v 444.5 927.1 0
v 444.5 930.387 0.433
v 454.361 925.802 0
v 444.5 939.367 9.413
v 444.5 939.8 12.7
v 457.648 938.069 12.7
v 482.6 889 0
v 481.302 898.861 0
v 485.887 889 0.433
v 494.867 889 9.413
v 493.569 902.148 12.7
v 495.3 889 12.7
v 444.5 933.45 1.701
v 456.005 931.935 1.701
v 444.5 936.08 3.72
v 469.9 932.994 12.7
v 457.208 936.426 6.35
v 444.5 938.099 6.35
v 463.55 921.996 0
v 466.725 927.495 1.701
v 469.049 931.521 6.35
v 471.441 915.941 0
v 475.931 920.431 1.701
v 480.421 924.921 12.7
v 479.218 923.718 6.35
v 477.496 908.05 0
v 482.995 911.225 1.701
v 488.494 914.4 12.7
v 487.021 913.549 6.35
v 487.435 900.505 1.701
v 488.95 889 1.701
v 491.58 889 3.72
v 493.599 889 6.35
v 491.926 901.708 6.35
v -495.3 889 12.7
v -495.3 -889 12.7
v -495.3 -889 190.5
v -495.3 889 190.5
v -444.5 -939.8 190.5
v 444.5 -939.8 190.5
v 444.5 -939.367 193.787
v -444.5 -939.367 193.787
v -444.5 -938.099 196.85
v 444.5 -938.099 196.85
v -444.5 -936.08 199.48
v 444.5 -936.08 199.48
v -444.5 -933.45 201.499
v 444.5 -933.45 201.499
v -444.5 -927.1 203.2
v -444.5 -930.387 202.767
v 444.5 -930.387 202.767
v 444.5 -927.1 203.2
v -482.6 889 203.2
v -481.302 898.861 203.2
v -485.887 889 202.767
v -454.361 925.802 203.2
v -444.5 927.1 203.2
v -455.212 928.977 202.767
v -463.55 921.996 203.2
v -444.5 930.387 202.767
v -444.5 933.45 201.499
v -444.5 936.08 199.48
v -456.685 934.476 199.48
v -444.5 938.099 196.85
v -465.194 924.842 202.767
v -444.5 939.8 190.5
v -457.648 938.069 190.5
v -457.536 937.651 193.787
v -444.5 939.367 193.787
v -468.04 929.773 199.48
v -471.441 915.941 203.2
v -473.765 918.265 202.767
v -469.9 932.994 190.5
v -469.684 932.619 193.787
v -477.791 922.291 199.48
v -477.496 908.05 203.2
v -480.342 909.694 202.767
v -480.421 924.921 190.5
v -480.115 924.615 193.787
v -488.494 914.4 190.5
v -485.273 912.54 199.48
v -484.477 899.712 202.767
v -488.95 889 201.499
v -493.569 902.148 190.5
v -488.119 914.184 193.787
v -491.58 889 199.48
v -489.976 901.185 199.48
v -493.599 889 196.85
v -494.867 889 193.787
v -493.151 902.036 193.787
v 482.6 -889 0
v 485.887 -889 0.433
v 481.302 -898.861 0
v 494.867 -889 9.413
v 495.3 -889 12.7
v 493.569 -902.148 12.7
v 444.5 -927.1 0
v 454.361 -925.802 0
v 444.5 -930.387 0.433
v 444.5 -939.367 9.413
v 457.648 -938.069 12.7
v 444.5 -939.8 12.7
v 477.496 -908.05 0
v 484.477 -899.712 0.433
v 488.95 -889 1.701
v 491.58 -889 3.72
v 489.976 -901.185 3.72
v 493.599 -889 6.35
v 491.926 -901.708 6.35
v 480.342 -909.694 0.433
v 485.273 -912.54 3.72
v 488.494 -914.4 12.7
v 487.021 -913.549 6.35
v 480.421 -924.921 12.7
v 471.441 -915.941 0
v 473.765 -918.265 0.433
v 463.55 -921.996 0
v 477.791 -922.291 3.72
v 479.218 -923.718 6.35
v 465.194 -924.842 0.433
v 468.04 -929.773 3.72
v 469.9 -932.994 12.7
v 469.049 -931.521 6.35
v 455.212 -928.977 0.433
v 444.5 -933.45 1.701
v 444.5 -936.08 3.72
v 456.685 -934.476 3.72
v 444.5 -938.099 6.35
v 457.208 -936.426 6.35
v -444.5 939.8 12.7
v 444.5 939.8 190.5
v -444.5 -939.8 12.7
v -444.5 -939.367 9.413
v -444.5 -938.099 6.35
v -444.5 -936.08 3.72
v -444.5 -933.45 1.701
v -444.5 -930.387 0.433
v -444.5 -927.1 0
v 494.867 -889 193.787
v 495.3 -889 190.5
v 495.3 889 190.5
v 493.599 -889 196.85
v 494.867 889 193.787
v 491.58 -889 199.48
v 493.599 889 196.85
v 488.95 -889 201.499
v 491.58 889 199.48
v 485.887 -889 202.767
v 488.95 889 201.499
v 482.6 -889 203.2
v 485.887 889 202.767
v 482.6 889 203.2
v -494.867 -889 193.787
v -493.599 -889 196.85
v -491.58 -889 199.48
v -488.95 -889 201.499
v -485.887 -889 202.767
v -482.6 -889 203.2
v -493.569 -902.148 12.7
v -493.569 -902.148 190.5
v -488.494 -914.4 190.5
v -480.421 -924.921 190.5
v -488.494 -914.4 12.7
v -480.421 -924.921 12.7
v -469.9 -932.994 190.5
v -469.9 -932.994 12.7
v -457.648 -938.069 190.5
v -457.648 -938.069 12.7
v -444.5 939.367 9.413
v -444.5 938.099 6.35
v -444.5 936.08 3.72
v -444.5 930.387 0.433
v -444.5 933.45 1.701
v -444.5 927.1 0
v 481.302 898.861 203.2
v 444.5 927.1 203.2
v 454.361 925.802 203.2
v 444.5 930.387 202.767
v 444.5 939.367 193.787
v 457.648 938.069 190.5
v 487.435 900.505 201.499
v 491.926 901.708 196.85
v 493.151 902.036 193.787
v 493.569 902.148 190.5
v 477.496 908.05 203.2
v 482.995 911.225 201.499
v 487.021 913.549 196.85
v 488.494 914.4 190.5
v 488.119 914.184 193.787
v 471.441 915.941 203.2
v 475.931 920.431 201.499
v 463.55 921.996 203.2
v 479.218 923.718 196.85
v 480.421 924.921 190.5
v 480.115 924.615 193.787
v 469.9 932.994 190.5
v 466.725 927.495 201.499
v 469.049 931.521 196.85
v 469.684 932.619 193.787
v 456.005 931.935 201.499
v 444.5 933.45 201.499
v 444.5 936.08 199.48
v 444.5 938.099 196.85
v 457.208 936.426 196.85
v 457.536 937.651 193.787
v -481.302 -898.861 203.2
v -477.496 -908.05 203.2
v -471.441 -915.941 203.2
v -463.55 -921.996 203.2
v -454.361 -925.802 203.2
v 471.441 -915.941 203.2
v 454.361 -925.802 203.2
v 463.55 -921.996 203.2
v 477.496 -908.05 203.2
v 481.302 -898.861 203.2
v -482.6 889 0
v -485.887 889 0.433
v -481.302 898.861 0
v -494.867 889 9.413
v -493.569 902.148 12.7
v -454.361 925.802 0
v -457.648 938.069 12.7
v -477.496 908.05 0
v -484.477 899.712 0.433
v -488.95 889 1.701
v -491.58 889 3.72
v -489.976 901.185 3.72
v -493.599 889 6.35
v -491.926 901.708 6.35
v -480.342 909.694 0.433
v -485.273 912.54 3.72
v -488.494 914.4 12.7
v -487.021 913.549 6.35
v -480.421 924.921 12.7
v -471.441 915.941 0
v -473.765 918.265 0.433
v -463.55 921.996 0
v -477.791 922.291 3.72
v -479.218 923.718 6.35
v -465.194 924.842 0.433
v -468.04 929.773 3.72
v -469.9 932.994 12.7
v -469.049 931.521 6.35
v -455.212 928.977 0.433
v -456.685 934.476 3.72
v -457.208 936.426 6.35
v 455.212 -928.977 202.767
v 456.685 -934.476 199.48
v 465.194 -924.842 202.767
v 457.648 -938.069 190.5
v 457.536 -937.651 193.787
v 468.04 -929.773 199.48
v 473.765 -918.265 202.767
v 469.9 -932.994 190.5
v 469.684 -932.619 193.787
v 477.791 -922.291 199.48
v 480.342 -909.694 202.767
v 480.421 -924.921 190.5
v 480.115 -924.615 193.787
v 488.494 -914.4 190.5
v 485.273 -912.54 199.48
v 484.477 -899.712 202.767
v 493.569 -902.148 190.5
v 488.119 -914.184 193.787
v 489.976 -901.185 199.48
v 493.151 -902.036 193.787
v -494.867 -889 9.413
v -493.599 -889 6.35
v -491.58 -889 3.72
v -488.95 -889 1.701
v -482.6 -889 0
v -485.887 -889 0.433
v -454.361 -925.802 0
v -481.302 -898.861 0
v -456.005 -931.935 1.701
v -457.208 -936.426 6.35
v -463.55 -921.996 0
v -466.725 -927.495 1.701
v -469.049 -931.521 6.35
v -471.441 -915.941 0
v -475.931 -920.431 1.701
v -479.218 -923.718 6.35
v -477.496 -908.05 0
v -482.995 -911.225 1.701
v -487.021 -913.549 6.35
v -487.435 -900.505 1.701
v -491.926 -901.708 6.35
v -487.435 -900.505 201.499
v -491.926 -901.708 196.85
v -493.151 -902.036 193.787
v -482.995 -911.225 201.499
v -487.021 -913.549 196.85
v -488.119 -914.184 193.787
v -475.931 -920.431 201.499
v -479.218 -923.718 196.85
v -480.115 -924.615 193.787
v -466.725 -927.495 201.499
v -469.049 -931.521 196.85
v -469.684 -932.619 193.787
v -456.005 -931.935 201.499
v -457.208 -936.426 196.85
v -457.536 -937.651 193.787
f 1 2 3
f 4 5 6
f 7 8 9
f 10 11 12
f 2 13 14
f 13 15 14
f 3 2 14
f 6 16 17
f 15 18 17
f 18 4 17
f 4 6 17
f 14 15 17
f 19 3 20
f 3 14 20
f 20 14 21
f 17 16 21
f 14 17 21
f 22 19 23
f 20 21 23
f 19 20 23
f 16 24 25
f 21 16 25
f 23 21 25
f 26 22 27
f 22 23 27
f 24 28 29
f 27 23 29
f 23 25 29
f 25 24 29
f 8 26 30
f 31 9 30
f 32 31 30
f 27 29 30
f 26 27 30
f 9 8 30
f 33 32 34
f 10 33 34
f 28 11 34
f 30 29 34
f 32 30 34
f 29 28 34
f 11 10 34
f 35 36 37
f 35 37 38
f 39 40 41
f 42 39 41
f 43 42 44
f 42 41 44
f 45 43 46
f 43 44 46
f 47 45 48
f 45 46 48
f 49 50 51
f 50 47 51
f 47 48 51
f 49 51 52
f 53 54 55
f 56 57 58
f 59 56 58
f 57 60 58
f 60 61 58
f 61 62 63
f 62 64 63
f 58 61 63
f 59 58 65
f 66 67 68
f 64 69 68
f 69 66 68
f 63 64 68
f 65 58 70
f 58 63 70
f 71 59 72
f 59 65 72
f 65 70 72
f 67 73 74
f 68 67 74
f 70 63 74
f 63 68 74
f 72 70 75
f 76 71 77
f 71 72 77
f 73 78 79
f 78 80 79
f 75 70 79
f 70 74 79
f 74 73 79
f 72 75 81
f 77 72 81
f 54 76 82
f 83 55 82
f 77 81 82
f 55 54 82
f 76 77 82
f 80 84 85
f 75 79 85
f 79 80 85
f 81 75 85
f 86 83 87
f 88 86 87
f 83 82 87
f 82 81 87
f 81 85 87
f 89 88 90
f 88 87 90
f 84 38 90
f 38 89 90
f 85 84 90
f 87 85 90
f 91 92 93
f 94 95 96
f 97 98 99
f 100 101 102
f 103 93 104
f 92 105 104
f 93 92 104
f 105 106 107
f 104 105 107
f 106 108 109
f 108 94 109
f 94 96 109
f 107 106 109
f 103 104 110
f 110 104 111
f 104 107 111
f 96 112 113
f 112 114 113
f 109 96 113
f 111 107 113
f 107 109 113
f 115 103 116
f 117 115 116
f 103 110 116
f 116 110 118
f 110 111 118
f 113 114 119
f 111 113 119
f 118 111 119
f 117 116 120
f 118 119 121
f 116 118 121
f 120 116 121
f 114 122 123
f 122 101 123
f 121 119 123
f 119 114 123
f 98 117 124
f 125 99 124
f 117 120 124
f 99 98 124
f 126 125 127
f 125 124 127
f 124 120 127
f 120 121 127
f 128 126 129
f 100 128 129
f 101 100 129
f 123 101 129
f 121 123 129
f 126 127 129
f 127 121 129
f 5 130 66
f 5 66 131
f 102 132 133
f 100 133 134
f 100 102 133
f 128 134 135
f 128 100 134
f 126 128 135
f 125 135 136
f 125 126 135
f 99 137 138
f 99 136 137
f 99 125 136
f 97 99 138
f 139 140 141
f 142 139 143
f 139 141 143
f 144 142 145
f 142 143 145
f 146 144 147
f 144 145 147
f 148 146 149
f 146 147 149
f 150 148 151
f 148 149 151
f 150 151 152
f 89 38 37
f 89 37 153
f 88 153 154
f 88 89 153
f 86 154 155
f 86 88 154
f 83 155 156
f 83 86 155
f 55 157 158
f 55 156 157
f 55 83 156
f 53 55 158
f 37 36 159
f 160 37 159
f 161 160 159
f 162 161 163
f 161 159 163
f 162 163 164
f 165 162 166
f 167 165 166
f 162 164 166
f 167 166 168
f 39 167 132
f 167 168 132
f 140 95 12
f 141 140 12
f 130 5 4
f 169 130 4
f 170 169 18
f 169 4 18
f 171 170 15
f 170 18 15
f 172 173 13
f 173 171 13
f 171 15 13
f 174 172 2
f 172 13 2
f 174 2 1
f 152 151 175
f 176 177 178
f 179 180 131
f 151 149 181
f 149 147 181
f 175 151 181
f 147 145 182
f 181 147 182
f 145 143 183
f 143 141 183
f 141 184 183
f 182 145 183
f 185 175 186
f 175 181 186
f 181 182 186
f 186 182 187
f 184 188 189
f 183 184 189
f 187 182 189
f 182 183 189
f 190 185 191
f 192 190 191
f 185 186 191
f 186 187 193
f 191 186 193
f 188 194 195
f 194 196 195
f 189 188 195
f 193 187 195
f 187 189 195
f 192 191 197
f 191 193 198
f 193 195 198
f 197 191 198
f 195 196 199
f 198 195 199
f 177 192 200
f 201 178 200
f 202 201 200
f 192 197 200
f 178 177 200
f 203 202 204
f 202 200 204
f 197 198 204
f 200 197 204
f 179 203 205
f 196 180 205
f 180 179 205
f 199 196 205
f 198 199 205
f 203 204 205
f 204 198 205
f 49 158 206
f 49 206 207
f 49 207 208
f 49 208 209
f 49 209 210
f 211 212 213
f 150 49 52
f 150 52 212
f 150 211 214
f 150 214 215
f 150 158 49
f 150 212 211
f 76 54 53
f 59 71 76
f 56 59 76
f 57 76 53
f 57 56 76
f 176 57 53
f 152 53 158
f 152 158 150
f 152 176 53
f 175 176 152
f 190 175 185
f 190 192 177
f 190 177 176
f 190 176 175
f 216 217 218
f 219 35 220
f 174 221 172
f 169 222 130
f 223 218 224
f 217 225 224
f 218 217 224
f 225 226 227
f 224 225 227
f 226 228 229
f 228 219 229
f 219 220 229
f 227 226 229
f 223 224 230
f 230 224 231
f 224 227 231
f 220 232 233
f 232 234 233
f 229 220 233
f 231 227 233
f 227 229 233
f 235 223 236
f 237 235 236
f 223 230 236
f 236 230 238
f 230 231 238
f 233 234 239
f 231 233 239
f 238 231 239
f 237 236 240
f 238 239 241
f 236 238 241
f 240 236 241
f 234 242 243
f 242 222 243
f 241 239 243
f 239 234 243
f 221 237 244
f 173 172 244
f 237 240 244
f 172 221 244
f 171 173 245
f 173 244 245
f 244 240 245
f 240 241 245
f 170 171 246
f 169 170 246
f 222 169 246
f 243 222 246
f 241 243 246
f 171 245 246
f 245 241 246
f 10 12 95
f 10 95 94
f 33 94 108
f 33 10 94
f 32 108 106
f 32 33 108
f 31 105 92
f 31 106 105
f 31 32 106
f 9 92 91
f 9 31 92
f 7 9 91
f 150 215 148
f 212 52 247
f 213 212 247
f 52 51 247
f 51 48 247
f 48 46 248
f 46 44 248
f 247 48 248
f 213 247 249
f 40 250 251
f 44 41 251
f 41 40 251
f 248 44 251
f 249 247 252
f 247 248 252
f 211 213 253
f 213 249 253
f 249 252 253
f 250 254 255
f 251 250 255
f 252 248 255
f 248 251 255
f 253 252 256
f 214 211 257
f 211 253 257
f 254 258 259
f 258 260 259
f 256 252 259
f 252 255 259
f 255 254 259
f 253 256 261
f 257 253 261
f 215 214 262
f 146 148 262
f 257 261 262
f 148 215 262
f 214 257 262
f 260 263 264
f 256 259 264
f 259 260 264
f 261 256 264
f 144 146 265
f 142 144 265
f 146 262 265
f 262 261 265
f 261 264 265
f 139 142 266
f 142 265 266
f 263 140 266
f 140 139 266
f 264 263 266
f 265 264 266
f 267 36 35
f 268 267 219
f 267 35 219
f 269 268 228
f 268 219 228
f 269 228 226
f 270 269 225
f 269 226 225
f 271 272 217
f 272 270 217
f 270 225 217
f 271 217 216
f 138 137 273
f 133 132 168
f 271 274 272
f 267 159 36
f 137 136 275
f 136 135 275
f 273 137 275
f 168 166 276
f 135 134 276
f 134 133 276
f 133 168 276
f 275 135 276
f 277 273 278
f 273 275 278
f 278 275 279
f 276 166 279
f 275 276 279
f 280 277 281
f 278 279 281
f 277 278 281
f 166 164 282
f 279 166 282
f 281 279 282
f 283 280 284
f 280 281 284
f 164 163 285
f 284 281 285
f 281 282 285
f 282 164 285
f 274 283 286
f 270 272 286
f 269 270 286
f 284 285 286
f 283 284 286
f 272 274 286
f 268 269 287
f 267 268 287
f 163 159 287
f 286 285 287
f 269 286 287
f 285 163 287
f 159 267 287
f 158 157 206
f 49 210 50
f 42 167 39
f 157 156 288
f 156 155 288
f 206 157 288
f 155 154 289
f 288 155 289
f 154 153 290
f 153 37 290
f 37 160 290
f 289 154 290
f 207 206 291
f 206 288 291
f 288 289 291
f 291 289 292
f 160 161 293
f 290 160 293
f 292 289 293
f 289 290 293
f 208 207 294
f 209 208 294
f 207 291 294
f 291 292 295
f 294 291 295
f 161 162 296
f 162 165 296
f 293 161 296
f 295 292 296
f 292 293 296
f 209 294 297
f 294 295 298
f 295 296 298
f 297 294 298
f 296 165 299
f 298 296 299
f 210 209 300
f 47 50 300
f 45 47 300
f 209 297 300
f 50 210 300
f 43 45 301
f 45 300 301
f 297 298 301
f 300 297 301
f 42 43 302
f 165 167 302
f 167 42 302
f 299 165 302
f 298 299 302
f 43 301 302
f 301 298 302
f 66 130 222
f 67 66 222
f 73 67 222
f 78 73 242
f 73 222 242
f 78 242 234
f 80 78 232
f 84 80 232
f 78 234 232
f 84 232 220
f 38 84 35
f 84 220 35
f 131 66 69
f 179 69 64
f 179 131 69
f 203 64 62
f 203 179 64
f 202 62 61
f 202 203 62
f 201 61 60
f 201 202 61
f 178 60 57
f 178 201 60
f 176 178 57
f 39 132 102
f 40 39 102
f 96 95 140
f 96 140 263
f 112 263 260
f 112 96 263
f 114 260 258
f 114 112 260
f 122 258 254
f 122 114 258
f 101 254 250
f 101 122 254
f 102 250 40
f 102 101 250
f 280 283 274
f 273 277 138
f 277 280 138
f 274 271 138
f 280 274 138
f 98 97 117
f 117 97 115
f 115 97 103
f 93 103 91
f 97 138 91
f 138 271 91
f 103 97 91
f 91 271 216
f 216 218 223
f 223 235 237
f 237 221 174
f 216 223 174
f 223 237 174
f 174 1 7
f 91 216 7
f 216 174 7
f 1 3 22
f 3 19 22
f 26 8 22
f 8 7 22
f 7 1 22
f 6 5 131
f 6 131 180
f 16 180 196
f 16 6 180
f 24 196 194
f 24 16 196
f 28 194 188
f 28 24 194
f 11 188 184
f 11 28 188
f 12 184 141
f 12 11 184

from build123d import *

# Parameters (mm, degrees)
F0_W         = 990.6
F0_H         = 1879.6
F1_DEPTH     = 203.2
F2_R         = 12.7
F3_T1_DEPTH  = 203.2
F3_T4_ANGLE  = 90
F3_T6_ANGLE  = 90
F3_T8_ANGLE  = 90
F3_T10_ANGLE = 90
F3_T12_ANGLE = 90
F3_T14_ANGLE = 90
F3_T16_ANGLE = 90
F3_T18_ANGLE = 90


# Not quite as in the source:
# - a fillet or chamfer that OpenCascade refuses, or shapes differently, is made with other operations: its cross-section is extruded or revolved along the edge and cut away or added


with BuildPart() as f1:
    # F0 (on Top) → F1 (new body)
    with BuildSketch(Plane.XY):
        Rectangle(F0_W, F0_H)
    extrude(amount=F1_DEPTH)

    # F2
    f2_edges = [f1.edges().sort_by_distance(p)[0] for p in [
        (-495.3, 0, 203.2),
        (0, -939.8, 203.2),
        (495.3, 0, 203.2),
        (0, 939.8, 203.2),
        (495.3, 0, 0),
        (0, -939.8, 0),
        (-495.3, 0, 0),
        (0, 939.8, 0),
    ]]
    fillet(f2_edges, radius=F2_R)

    # F3: fillet of radius 50.8 on 4 edges, made by hand

    # F3_s2 → F3_t1 (cut)
    with BuildSketch(Plane.XY):
        with BuildLine():
            ThreePointArc((-495.3, -889), (-480.4210244843, -924.9210244843), (-444.5, -939.8))
            Line((-444.5, -939.8), (-444.5, -940.816))
            Line((-444.5, -940.816), (-496.316, -940.816))
            Line((-496.316, -940.816), (-496.316, -889))
            Line((-496.316, -889), (-495.3, -889))
        make_face()
        with BuildLine():
            ThreePointArc((495.3, -889), (480.4210244843, -924.9210244843), (444.5, -939.8))
            Line((444.5, -939.8), (444.5, -940.816))
            Line((444.5, -940.816), (496.316, -940.816))
            Line((496.316, -940.816), (496.316, -889))
            Line((496.316, -889), (495.3, -889))
        make_face()
        with BuildLine():
            ThreePointArc((444.5, 939.8), (480.4210244843, 924.9210244843), (495.3, 889))
            Line((495.3, 889), (496.316, 889))
            Line((496.316, 889), (496.316, 940.816))
            Line((496.316, 940.816), (444.5, 940.816))
            Line((444.5, 940.816), (444.5, 939.8))
        make_face()
        with BuildLine():
            ThreePointArc((-444.5, 939.8), (-480.4210244843, 924.9210244843), (-495.3, 889))
            Line((-495.3, 889), (-496.316, 889))
            Line((-496.316, 889), (-496.316, 940.816))
            Line((-496.316, 940.816), (-444.5, 940.816))
            Line((-444.5, 940.816), (-444.5, 939.8))
        make_face()
    extrude(amount=F3_T1_DEPTH, mode=Mode.SUBTRACT)

    # F3_s3 → F3_t4 (revolve, cut)
    with BuildSketch(Plane.XZ.offset(-889)):
        with BuildLine():
            ThreePointArc((-482.6, 0), (-491.5802561211, 3.7197438789), (-495.3, 12.7))
            Line((-495.3, 12.7), (-495.3, 0))
            Line((-495.3, 0), (-482.6, 0))
        make_face()
    revolve(axis=Axis((-444.5, 889, 0), (0, 0, -1)), revolution_arc=F3_T4_ANGLE, mode=Mode.SUBTRACT)

    # F3_s5 → F3_t6 (revolve, cut)
    with BuildSketch(Plane.YZ.offset(-444.5)):
        with BuildLine():
            ThreePointArc((927.1, 203.2), (936.0802561211, 199.4802561211), (939.8, 190.5))
            Line((939.8, 190.5), (939.8, 203.2))
            Line((939.8, 203.2), (927.1, 203.2))
        make_face()
    revolve(axis=Axis((-444.5, 889, 203.2), (0, 0, 1)), revolution_arc=F3_T6_ANGLE, mode=Mode.SUBTRACT)

    # F3_s7 → F3_t8 (revolve, cut)
    with BuildSketch(Plane.YZ.offset(444.5)):
        with BuildLine():
            ThreePointArc((927.1, 0), (936.0802561211, 3.7197438789), (939.8, 12.7))
            Line((939.8, 12.7), (939.8, 0))
            Line((939.8, 0), (927.1, 0))
        make_face()
    revolve(axis=Axis((444.5, 889, 0), (0, 0, -1)), revolution_arc=F3_T8_ANGLE, mode=Mode.SUBTRACT)

    # F3_s9 → F3_t10 (revolve, cut)
    with BuildSketch(Plane.XZ.offset(-889)):
        with BuildLine():
            ThreePointArc((482.6, 203.2), (491.5802561211, 199.4802561211), (495.3, 190.5))
            Line((495.3, 190.5), (495.3, 203.2))
            Line((495.3, 203.2), (482.6, 203.2))
        make_face()
    revolve(axis=Axis((444.5, 889, 203.2), (0, 0, 1)), revolution_arc=F3_T10_ANGLE, mode=Mode.SUBTRACT)

    # F3_s11 → F3_t12 (revolve, cut)
    with BuildSketch(Plane.XZ.offset(889)):
        with BuildLine():
            ThreePointArc((482.6, 0), (491.5802561211, 3.7197438789), (495.3, 12.7))
            Line((495.3, 12.7), (495.3, 0))
            Line((495.3, 0), (482.6, 0))
        make_face()
    revolve(axis=Axis((444.5, -889, 0), (0, 0, -1)), revolution_arc=F3_T12_ANGLE, mode=Mode.SUBTRACT)

    # F3_s13 → F3_t14 (revolve, cut)
    with BuildSketch(Plane.YZ.offset(444.5)):
        with BuildLine():
            ThreePointArc((-927.1, 203.2), (-936.0802561211, 199.4802561211), (-939.8, 190.5))
            Line((-939.8, 190.5), (-939.8, 203.2))
            Line((-939.8, 203.2), (-927.1, 203.2))
        make_face()
    revolve(axis=Axis((444.5, -889, 203.2), (0, 0, 1)), revolution_arc=F3_T14_ANGLE, mode=Mode.SUBTRACT)

    # F3_s15 → F3_t16 (revolve, cut)
    with BuildSketch(Plane.YZ.offset(-444.5)):
        with BuildLine():
            ThreePointArc((-927.1, 0), (-936.0802561211, 3.7197438789), (-939.8, 12.7))
            Line((-939.8, 12.7), (-939.8, 0))
            Line((-939.8, 0), (-927.1, 0))
        make_face()
    revolve(axis=Axis((-444.5, -889, 0), (0, 0, -1)), revolution_arc=F3_T16_ANGLE, mode=Mode.SUBTRACT)

    # F3_s17 → F3_t18 (revolve, cut)
    with BuildSketch(Plane.XZ.offset(889)):
        with BuildLine():
            ThreePointArc((-482.6, 203.2), (-491.5802561211, 199.4802561211), (-495.3, 190.5))
            Line((-495.3, 190.5), (-495.3, 203.2))
            Line((-495.3, 203.2), (-482.6, 203.2))
        make_face()
    revolve(axis=Axis((-444.5, -889, 203.2), (0, 0, 1)), revolution_arc=F3_T18_ANGLE, mode=Mode.SUBTRACT)


solid = f1.part
